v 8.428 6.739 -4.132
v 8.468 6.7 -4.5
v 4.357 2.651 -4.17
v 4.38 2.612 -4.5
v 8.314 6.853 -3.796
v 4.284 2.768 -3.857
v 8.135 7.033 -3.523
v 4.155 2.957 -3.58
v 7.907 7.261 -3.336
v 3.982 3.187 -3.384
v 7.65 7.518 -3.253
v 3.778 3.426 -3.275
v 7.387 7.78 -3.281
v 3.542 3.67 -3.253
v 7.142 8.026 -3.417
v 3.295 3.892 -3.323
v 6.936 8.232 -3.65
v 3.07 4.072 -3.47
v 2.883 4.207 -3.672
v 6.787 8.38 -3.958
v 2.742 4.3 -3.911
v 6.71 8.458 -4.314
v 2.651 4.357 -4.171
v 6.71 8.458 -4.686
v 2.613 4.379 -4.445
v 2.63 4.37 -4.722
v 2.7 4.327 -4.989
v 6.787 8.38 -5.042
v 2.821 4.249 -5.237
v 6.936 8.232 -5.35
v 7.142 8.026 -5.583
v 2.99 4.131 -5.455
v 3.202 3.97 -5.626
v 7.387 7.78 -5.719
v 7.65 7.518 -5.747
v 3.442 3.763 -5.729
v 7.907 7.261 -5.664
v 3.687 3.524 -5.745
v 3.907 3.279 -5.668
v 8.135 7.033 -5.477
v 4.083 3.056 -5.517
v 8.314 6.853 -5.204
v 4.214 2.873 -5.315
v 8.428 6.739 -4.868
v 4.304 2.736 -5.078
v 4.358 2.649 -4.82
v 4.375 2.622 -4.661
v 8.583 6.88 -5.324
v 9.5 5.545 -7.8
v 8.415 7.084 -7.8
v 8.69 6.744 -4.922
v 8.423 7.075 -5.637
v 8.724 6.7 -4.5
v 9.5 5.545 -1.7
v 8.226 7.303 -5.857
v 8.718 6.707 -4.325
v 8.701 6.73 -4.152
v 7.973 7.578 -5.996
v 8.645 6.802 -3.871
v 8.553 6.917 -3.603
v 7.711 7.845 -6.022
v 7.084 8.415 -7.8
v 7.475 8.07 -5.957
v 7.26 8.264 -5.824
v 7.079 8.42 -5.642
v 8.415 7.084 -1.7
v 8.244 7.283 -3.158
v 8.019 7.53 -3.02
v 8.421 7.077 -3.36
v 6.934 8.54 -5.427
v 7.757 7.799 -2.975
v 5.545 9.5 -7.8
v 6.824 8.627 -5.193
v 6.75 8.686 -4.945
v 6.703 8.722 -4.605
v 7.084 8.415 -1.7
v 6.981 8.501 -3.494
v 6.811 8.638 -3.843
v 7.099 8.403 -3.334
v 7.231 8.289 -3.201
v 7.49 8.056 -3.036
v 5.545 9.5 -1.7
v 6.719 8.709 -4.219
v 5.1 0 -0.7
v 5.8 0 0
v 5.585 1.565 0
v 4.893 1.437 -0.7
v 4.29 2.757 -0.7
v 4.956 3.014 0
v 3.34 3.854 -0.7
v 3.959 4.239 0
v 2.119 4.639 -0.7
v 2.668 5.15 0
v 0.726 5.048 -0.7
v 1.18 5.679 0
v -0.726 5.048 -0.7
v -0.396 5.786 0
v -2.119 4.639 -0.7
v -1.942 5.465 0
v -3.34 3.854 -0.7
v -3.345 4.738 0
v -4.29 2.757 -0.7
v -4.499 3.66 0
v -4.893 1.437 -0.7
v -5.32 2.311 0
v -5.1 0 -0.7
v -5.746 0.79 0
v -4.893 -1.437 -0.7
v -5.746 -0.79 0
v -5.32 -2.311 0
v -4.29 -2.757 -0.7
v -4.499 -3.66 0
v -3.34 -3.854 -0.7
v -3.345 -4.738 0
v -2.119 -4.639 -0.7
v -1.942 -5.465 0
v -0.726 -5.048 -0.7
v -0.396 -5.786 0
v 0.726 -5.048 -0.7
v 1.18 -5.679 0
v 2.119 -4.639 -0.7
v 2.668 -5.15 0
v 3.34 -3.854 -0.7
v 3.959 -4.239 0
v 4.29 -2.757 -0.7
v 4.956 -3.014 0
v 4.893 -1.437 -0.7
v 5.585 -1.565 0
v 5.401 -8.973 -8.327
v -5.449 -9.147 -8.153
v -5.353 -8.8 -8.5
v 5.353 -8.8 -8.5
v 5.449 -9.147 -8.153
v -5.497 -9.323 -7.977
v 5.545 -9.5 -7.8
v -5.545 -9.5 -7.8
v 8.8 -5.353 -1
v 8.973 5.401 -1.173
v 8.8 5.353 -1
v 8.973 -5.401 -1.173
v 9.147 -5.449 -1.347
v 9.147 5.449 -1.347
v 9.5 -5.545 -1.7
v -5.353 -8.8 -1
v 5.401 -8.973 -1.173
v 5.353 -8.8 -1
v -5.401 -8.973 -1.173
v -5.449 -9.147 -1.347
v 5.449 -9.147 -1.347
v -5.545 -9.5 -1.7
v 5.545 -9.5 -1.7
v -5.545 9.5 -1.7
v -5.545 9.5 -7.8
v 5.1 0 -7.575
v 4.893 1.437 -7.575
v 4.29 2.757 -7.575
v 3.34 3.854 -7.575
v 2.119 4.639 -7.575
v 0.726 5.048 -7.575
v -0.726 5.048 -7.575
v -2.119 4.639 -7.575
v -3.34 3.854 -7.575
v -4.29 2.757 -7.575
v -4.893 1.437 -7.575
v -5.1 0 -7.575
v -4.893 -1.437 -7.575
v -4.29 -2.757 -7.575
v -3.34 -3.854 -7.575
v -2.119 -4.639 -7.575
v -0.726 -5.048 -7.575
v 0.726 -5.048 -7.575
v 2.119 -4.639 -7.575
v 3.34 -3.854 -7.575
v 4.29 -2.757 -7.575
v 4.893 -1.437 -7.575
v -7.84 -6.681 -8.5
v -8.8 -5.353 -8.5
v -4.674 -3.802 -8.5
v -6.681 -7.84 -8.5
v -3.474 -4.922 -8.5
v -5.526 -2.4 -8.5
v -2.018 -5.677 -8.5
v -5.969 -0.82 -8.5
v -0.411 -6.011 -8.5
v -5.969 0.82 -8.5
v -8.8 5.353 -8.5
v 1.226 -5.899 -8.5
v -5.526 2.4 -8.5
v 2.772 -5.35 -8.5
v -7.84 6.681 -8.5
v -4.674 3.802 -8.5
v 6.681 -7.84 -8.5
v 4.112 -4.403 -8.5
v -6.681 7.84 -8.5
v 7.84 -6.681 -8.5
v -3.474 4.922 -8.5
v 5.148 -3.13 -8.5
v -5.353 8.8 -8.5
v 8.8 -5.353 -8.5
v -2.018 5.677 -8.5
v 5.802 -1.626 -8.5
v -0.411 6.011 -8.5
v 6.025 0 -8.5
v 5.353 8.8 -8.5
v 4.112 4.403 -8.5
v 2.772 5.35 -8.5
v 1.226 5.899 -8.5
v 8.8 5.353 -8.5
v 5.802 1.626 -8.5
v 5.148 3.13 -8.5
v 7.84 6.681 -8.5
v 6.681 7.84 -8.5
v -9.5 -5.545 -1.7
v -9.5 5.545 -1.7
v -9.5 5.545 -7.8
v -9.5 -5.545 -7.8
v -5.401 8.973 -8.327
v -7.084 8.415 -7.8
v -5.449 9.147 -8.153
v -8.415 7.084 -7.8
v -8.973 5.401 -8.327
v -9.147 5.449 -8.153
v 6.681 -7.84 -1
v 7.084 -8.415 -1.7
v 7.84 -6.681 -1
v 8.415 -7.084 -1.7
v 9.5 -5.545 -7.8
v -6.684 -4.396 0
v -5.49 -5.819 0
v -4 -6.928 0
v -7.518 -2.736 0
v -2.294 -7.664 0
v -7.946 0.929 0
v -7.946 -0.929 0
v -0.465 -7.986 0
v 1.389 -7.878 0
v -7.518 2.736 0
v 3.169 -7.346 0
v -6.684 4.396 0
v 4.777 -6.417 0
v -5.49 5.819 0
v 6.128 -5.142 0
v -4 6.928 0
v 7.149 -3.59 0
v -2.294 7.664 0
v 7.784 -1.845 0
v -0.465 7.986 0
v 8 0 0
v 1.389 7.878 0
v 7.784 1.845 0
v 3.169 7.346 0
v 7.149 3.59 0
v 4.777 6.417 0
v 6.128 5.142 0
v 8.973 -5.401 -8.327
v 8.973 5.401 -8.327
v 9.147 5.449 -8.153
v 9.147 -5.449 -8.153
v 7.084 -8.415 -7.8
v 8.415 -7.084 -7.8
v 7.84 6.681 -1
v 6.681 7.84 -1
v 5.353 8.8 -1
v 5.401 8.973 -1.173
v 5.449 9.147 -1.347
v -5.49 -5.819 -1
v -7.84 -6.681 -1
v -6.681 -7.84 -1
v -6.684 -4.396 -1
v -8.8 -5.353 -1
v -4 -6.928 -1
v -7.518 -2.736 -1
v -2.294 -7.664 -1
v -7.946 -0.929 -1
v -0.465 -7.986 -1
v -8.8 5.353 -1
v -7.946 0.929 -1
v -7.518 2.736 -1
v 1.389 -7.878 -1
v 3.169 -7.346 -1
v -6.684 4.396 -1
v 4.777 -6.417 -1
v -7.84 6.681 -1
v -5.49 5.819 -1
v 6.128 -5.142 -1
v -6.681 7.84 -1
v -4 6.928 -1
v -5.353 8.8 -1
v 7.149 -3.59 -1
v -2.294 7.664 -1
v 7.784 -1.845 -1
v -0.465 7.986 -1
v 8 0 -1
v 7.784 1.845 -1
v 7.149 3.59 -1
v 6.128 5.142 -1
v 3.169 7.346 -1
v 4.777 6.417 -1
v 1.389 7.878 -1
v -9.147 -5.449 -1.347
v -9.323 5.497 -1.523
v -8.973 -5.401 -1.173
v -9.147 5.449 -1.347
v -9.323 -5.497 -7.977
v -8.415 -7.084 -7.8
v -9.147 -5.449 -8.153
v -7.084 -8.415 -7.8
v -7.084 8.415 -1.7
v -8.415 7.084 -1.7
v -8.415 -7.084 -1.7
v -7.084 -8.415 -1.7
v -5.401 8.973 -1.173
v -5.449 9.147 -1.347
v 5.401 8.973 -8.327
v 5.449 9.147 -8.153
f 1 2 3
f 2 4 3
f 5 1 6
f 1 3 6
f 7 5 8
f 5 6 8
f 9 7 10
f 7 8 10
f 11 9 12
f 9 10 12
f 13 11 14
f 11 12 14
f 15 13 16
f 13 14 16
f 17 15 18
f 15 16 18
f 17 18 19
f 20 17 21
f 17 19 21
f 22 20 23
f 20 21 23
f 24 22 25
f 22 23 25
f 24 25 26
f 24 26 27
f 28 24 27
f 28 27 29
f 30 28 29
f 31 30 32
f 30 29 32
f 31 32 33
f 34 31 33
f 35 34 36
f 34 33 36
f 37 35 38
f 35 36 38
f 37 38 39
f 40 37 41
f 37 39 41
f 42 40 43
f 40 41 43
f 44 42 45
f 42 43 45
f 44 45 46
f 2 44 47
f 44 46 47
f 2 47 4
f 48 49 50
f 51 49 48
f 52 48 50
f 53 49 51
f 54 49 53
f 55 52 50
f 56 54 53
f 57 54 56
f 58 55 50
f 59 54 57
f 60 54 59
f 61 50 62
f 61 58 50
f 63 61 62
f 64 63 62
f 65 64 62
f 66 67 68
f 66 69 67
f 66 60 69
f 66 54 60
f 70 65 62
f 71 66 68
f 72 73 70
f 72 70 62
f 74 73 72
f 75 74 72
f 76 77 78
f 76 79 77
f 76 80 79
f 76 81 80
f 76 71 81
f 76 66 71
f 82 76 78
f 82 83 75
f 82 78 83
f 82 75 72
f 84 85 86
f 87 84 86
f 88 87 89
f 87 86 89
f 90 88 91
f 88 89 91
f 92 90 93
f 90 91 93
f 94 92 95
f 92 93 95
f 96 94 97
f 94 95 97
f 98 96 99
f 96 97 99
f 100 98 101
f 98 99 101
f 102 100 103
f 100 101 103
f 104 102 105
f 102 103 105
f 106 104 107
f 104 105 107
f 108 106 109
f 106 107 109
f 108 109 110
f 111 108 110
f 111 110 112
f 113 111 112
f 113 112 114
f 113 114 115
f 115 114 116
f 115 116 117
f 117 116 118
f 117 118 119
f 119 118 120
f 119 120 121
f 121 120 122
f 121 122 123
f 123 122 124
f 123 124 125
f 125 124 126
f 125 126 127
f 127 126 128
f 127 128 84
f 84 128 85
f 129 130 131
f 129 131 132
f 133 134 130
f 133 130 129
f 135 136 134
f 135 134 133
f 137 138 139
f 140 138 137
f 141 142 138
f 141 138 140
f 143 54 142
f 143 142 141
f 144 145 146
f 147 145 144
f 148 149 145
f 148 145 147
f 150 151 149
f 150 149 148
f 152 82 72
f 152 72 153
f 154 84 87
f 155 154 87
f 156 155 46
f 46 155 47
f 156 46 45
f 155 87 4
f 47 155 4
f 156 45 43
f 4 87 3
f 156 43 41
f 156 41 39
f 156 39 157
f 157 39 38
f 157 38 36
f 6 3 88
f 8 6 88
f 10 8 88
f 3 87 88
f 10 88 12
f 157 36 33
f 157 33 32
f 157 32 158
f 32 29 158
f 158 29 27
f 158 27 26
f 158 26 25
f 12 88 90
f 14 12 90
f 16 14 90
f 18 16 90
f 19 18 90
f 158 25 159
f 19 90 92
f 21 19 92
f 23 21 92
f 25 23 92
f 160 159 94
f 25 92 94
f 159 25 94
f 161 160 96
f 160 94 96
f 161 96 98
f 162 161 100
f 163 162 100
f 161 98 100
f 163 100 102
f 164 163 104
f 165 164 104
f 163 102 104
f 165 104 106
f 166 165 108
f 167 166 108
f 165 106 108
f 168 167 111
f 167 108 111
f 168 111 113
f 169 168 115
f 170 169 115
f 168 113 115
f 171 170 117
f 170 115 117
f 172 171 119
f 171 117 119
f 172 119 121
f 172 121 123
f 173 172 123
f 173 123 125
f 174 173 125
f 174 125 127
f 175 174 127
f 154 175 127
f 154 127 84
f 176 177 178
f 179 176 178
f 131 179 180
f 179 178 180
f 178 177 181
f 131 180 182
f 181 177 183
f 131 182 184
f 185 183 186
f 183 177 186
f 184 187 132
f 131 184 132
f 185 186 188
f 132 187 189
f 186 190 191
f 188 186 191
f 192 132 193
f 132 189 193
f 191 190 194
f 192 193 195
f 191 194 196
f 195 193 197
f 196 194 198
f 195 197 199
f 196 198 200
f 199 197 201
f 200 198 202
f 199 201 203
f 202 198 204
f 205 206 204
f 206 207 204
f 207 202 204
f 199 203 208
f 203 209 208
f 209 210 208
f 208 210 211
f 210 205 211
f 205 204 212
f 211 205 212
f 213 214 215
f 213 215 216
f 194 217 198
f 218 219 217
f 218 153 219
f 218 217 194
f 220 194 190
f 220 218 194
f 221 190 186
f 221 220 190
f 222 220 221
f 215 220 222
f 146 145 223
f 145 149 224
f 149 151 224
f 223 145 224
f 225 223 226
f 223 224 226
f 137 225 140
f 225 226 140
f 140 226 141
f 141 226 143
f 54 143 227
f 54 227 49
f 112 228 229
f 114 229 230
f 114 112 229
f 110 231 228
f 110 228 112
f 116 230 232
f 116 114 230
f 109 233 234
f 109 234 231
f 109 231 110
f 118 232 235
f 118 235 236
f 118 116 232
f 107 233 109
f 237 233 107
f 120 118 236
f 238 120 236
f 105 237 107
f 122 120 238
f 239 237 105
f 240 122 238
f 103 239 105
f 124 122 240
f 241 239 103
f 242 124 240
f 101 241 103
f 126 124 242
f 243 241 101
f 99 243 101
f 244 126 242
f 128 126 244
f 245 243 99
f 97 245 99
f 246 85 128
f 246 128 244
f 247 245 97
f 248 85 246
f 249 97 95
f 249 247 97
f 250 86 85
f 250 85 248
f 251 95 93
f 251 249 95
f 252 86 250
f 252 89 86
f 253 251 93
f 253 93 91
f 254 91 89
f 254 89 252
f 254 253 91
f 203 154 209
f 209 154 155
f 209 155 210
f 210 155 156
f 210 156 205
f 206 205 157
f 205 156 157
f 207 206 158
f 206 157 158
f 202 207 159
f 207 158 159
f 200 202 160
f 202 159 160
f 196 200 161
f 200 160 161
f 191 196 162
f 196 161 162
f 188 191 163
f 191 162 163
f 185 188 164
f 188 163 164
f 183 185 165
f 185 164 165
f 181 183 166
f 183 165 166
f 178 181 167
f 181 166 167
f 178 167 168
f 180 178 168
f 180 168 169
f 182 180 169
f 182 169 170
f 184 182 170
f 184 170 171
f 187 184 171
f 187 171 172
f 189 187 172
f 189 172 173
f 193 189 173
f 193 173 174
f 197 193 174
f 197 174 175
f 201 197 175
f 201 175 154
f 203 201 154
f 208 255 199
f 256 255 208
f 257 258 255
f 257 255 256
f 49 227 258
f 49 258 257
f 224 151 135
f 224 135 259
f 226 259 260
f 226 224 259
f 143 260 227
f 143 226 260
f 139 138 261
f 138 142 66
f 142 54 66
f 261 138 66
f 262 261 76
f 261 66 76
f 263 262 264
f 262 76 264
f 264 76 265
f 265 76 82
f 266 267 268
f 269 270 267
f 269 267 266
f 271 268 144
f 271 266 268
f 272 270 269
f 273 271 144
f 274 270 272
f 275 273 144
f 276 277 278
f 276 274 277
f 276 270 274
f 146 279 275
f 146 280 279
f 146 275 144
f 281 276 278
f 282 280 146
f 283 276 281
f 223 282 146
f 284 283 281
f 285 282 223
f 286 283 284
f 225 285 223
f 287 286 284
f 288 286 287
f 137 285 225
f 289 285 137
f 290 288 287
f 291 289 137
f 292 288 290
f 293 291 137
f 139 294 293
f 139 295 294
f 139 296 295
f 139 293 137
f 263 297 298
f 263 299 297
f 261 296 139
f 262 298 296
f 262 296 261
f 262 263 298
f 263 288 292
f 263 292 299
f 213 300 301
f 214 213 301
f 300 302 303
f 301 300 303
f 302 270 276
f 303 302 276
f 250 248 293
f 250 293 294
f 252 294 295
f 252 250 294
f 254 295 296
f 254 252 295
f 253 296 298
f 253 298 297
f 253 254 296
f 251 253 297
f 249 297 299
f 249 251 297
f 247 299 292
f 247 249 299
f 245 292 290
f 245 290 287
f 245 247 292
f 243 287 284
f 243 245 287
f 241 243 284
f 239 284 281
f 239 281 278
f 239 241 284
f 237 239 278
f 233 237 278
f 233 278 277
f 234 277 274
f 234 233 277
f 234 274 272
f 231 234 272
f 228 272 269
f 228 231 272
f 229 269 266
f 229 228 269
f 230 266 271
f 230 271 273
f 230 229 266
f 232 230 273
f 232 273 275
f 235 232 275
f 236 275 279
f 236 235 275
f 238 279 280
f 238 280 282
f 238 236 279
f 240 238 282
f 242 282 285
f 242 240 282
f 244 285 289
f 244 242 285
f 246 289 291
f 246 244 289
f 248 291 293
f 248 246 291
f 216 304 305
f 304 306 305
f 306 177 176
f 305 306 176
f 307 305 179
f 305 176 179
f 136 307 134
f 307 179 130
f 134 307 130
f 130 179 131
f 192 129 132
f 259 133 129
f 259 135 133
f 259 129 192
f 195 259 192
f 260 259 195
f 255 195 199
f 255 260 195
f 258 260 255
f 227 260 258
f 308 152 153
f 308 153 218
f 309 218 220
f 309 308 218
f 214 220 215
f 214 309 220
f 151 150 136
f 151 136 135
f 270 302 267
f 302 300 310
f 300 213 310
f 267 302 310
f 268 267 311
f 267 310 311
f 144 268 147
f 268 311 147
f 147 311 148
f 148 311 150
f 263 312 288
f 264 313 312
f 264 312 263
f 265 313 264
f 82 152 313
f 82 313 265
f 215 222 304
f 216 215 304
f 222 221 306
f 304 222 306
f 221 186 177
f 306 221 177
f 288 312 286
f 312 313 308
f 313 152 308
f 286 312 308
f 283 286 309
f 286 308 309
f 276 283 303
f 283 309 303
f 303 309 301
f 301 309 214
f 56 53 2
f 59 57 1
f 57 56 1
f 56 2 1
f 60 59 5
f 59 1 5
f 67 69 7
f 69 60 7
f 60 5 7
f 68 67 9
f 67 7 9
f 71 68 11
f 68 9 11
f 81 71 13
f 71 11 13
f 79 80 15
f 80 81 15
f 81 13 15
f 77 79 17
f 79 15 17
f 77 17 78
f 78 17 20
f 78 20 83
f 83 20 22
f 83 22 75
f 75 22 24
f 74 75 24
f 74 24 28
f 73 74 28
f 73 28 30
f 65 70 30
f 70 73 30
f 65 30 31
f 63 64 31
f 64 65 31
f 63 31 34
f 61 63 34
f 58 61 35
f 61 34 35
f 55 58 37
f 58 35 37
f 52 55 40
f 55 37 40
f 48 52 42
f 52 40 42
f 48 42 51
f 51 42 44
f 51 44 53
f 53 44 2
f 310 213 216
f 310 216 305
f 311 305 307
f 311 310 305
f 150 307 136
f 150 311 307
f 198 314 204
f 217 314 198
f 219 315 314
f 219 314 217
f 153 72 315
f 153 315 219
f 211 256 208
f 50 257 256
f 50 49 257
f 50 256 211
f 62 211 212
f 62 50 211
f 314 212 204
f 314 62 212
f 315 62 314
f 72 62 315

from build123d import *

# Parameters (mm, degrees)
BOSS_EXTRUDE1_DEPTH          = 8.5
SKETCH2_OUTSIDE_W            = 26.636
SKETCH2_OUTSIDE_H            = 26.636
SKETCH2_OUTSIDE_R            = 8
CUT_EXTRUDE1_DEPTH           = 1
CHAMFER2_SIZE                = 0.7
M12_TAPPED_HOLE1_D           = 10.2
M12_TAPPED_HOLE1_DEPTH       = 10
M12_TAPPED_HOLE1_CSINK_D     = 12.05
M12_TAPPED_HOLE1_CSINK_ANGLE = 90
M12_TAPPED_HOLE1_TIP         = 3.064389157
CHAMFER3_SIZE                = 0.7
M3_TAPPED_HOLE5_D            = 2.5
M3_TAPPED_HOLE5_DEPTH        = 7.5
M3_TAPPED_HOLE5_CSINK_D      = 3.05
M3_TAPPED_HOLE5_CSINK_ANGLE  = 90
M3_TAPPED_HOLE5_TIP          = 0.751075774


with BuildPart() as part:
    # Sketch1 → Boss-Extrude1 (new body)
    with BuildSketch(Plane.XY):
        with BuildLine():
            Line((-9.5, 5.545268253), (-9.5, -5.545268253))
            ThreePointArc((-9.5, -5.545268253), (-7.778174593, -7.778174593), (-5.545268253, -9.5))
            Line((-5.545268253, -9.5), (5.545268253, -9.5))
            ThreePointArc((5.545268253, -9.5), (7.778174593, -7.778174593), (9.5, -5.545268253))
            Line((9.5, -5.545268253), (9.5, 5.545268253))
            ThreePointArc((9.5, 5.545268253), (7.778174593, 7.778174593), (5.545268253, 9.5))
            Line((5.545268253, 9.5), (-5.545268253, 9.5))
            ThreePointArc((-5.545268253, 9.5), (-7.778174593, 7.778174593), (-9.5, 5.545268253))
        make_face()
    extrude(amount=-BOSS_EXTRUDE1_DEPTH)

    # Sketch2 outside → Cut-Extrude1 (cut)
    with BuildSketch(Plane.XY):
        Rectangle(SKETCH2_OUTSIDE_W, SKETCH2_OUTSIDE_H)
        Circle(SKETCH2_OUTSIDE_R, mode=Mode.SUBTRACT)
    extrude(amount=-CUT_EXTRUDE1_DEPTH, mode=Mode.SUBTRACT)

    # Chamfer2
    chamfer2_edges = [part.edges().sort_by_distance(p)[0] for p in [
        (-7.778174593, 7.778174593, -8.5),
        (-9.5, 0, -8.5),
        (-7.778174593, -7.778174593, -8.5),
        (0, -9.5, -8.5),
        (7.778174593, -7.778174593, -8.5),
        (9.5, 0, -8.5),
        (0, 9.5, -1),
        (7.778174593, 7.778174593, -1),
        (9.5, 0, -1),
        (7.778174593, -7.778174593, -1),
        (0, -9.5, -1),
        (-7.778174593, -7.778174593, -1),
        (-9.5, 0, -1),
        (-7.778174593, 7.778174593, -1),
        (7.778174593, 7.778174593, -8.5),
        (0, 9.5, -8.5),
    ]]
    chamfer(chamfer2_edges, length=CHAMFER2_SIZE)

    # M12 Tapped Hole1
    with Locations(Plane(origin=(0, 0, -8.5), x_dir=(-1, 0, 0), z_dir=(0, 0, -1))):
        with Locations((0, 0)):
            CounterSinkHole(M12_TAPPED_HOLE1_D / 2, M12_TAPPED_HOLE1_CSINK_D / 2, depth=M12_TAPPED_HOLE1_DEPTH, counter_sink_angle=M12_TAPPED_HOLE1_CSINK_ANGLE)
            with Locations((0, 0, -(M12_TAPPED_HOLE1_DEPTH + M12_TAPPED_HOLE1_TIP / 2))):  # 118° drill point
                Cone(0, M12_TAPPED_HOLE1_D / 2, M12_TAPPED_HOLE1_TIP, mode=Mode.SUBTRACT)

    # Chamfer3
    chamfer3_edges = [part.edges().sort_by_distance(p)[0] for p in [
        (-5.1, 0, 0),
    ]]
    chamfer(chamfer3_edges, length=CHAMFER3_SIZE)

    # M3 Tapped Hole5
    with Locations(Plane(origin=(7.778174593, 7.778174593, -4.5), x_dir=(-0.707106781187, 0.707106781187, 0), z_dir=(0.707106781187, 0.707106781187, 0))):
        with Locations((0, 0)):
            CounterSinkHole(M3_TAPPED_HOLE5_D / 2, M3_TAPPED_HOLE5_CSINK_D / 2, depth=M3_TAPPED_HOLE5_DEPTH, counter_sink_angle=M3_TAPPED_HOLE5_CSINK_ANGLE)
            with Locations((0, 0, -(M3_TAPPED_HOLE5_DEPTH + M3_TAPPED_HOLE5_TIP / 2))):  # 118° drill point
                Cone(0, M3_TAPPED_HOLE5_D / 2, M3_TAPPED_HOLE5_TIP, mode=Mode.SUBTRACT)


solid = part.part
